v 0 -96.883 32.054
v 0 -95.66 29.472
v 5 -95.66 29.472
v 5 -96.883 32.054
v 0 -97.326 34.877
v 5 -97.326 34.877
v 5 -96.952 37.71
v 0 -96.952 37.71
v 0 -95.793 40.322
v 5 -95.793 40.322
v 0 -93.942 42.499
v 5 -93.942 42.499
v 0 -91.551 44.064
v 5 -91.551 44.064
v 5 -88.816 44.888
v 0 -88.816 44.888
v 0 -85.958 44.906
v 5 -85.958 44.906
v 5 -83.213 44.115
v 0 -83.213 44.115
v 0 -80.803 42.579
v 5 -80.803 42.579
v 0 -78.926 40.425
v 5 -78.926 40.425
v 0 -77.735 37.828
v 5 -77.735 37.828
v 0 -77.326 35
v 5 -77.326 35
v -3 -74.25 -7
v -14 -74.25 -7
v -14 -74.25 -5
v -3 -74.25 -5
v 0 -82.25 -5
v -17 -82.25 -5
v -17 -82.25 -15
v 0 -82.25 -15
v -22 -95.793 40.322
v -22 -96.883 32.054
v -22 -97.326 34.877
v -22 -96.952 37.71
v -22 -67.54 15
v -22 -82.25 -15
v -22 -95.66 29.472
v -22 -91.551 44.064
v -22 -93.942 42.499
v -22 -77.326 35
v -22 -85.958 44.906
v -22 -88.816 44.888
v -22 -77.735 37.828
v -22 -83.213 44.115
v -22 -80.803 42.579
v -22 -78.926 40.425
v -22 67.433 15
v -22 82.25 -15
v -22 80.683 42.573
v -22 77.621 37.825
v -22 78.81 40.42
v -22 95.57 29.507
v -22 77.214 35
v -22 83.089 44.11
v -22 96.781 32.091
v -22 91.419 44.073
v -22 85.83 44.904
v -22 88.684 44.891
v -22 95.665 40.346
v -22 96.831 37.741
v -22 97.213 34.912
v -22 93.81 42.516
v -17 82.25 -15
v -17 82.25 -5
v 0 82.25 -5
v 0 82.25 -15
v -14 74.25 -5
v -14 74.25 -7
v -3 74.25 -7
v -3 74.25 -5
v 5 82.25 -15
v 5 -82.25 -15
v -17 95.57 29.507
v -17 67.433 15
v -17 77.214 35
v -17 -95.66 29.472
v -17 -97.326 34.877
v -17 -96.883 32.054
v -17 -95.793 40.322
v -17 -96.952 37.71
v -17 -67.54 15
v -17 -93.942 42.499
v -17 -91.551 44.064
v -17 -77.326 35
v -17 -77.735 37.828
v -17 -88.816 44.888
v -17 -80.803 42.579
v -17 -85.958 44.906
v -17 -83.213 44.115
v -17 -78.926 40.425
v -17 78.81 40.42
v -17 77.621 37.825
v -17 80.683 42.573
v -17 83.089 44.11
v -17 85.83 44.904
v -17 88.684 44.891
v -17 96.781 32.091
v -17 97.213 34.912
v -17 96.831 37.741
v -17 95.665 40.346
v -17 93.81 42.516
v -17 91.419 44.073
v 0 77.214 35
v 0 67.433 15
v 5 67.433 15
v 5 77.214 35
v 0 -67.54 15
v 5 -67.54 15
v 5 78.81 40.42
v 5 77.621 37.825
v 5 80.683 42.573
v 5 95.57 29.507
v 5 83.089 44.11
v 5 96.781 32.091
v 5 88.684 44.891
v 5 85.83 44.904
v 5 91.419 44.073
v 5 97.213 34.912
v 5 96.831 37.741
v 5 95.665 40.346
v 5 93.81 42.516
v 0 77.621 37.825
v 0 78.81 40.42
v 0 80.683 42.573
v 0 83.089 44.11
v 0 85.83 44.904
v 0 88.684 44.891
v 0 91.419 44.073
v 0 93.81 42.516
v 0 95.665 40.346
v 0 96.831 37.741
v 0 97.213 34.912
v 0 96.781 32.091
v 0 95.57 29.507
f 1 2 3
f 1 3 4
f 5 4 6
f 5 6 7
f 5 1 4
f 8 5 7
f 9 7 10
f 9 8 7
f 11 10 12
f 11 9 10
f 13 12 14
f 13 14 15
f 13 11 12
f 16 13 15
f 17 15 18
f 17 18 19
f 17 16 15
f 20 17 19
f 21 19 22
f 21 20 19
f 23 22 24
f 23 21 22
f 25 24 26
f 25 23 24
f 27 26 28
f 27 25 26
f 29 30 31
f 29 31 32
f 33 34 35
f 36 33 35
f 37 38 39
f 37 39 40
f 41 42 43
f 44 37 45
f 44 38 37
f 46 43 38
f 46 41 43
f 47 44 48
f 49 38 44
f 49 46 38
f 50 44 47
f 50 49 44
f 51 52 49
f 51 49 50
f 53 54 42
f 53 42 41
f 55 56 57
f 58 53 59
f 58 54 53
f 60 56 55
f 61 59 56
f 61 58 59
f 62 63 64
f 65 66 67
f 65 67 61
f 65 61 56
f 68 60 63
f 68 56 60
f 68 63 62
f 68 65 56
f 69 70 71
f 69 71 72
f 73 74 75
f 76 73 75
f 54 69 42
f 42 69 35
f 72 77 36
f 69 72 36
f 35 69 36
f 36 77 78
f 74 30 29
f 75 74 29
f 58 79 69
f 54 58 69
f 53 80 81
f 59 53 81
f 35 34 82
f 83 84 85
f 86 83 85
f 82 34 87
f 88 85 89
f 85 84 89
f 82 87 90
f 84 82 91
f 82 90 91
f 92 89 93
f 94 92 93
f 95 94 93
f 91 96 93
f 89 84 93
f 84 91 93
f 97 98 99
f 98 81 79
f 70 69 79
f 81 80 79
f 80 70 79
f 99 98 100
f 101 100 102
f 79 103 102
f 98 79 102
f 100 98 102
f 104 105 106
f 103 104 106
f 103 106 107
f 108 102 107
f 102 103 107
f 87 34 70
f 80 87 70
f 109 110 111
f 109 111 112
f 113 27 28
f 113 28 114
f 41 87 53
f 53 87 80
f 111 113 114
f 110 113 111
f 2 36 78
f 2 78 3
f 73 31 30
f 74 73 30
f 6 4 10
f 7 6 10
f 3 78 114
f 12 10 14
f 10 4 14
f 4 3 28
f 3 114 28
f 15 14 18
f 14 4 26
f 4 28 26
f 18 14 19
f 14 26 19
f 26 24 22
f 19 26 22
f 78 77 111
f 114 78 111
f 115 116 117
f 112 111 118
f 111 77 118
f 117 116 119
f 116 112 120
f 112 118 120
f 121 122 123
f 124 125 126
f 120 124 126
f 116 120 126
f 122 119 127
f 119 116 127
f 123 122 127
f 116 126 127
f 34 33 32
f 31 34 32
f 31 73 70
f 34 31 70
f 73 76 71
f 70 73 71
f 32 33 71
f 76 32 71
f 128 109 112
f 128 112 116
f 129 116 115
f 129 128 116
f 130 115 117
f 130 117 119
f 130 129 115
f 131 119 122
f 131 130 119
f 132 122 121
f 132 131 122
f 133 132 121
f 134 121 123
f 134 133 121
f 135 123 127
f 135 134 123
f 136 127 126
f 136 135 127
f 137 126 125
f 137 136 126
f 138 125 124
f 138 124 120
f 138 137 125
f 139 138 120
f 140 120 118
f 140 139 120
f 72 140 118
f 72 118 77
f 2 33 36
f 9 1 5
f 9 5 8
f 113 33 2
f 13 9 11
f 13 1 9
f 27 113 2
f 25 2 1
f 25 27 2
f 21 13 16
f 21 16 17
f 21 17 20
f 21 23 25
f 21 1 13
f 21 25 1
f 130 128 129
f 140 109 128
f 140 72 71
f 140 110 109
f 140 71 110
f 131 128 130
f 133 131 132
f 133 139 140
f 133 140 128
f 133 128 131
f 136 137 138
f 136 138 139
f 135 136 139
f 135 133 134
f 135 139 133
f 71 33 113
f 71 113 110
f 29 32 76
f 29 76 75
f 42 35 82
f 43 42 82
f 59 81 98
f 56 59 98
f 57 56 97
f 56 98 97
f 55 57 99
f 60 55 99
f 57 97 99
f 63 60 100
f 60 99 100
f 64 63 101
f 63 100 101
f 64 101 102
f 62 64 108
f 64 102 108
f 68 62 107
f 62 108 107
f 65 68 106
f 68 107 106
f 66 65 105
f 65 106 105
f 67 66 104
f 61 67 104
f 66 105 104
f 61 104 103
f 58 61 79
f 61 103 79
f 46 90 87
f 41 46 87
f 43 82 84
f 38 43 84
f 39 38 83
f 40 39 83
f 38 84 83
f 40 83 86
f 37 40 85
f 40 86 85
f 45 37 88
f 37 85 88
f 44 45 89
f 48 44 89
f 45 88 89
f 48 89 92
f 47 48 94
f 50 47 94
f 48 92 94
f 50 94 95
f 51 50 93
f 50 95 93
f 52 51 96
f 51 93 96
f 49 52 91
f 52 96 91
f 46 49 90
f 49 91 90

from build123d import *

# Parameters (mm, degrees)
SALIENTE_EXTRUIR1_DEPTH = 5
CROQUIS3_W              = 10
CROQUIS3_H              = 164.5
SALIENTE_EXTRUIR2_DEPTH = 10
VACIADO1_START          = -74.25
VACIADO1_OUTLINE_W      = 11
VACIADO1_OUTLINE_H      = 2
VACIADO1_DEPTH          = 148.5


# Read off the part's stored shape, not the designer's step: Vaciado1
with BuildPart() as part:
    # Croquis1 → Saliente-Extruir1 (new body)
    with BuildSketch(Plane(origin=(0, 0, 0), x_dir=(0, 0, -1), z_dir=(1, 0, 0))):
        with BuildLine():
            Line((-29.506547344, 95.56963472), (15, 82.25))
            Line((15, 82.25), (15, -82.25))
            Line((15, -82.25), (-29.472062031, -95.659500692))
            ThreePointArc((-29.472062031, -95.659500692), (-44.574231242, -90.213203382), (-35, -77.326319918))
            Line((-35, -77.326319918), (-15, -67.539809421))
            Line((-15, -67.539809421), (-15, 67.43308889))
            Line((-15, 67.43308889), (-35, 77.213680082))
            ThreePointArc((-35, 77.213680082), (-44.580176052, 90.080773873), (-29.506547344, 95.56963472))
        make_face()
    extrude(amount=SALIENTE_EXTRUIR1_DEPTH)


with BuildPart() as body_2:
    # Simetría3: mirrored copy
    add(part.part.mirror(Plane(origin=(-8.5, 0, 0), x_dir=(0, 0, 1), z_dir=(1, 0, 0))))


with BuildPart() as part_1:
    add(part.part)

    add(body_2.part)  # Saliente-Extruir2 merges body 2
    # Croquis3 → Saliente-Extruir2 (add, symmetric)
    with BuildSketch(Plane(origin=(-8.5, 0, 0), x_dir=(0, 0, -1), z_dir=(1, 0, 0))):
        with Locations((10, 0)):
            Rectangle(CROQUIS3_W, CROQUIS3_H)
    extrude(amount=SALIENTE_EXTRUIR2_DEPTH, both=True)

    # Vaciado1 outline → Vaciado1 (cut)
    with BuildSketch(Plane(origin=(0, 0, 0), x_dir=(1, 0, 0), z_dir=(0, 1, 0)).offset(VACIADO1_START)):
        with Locations((-8.5, 6)):
            Rectangle(VACIADO1_OUTLINE_W, VACIADO1_OUTLINE_H)
    extrude(amount=VACIADO1_DEPTH, mode=Mode.SUBTRACT)


solid = part_1.part
